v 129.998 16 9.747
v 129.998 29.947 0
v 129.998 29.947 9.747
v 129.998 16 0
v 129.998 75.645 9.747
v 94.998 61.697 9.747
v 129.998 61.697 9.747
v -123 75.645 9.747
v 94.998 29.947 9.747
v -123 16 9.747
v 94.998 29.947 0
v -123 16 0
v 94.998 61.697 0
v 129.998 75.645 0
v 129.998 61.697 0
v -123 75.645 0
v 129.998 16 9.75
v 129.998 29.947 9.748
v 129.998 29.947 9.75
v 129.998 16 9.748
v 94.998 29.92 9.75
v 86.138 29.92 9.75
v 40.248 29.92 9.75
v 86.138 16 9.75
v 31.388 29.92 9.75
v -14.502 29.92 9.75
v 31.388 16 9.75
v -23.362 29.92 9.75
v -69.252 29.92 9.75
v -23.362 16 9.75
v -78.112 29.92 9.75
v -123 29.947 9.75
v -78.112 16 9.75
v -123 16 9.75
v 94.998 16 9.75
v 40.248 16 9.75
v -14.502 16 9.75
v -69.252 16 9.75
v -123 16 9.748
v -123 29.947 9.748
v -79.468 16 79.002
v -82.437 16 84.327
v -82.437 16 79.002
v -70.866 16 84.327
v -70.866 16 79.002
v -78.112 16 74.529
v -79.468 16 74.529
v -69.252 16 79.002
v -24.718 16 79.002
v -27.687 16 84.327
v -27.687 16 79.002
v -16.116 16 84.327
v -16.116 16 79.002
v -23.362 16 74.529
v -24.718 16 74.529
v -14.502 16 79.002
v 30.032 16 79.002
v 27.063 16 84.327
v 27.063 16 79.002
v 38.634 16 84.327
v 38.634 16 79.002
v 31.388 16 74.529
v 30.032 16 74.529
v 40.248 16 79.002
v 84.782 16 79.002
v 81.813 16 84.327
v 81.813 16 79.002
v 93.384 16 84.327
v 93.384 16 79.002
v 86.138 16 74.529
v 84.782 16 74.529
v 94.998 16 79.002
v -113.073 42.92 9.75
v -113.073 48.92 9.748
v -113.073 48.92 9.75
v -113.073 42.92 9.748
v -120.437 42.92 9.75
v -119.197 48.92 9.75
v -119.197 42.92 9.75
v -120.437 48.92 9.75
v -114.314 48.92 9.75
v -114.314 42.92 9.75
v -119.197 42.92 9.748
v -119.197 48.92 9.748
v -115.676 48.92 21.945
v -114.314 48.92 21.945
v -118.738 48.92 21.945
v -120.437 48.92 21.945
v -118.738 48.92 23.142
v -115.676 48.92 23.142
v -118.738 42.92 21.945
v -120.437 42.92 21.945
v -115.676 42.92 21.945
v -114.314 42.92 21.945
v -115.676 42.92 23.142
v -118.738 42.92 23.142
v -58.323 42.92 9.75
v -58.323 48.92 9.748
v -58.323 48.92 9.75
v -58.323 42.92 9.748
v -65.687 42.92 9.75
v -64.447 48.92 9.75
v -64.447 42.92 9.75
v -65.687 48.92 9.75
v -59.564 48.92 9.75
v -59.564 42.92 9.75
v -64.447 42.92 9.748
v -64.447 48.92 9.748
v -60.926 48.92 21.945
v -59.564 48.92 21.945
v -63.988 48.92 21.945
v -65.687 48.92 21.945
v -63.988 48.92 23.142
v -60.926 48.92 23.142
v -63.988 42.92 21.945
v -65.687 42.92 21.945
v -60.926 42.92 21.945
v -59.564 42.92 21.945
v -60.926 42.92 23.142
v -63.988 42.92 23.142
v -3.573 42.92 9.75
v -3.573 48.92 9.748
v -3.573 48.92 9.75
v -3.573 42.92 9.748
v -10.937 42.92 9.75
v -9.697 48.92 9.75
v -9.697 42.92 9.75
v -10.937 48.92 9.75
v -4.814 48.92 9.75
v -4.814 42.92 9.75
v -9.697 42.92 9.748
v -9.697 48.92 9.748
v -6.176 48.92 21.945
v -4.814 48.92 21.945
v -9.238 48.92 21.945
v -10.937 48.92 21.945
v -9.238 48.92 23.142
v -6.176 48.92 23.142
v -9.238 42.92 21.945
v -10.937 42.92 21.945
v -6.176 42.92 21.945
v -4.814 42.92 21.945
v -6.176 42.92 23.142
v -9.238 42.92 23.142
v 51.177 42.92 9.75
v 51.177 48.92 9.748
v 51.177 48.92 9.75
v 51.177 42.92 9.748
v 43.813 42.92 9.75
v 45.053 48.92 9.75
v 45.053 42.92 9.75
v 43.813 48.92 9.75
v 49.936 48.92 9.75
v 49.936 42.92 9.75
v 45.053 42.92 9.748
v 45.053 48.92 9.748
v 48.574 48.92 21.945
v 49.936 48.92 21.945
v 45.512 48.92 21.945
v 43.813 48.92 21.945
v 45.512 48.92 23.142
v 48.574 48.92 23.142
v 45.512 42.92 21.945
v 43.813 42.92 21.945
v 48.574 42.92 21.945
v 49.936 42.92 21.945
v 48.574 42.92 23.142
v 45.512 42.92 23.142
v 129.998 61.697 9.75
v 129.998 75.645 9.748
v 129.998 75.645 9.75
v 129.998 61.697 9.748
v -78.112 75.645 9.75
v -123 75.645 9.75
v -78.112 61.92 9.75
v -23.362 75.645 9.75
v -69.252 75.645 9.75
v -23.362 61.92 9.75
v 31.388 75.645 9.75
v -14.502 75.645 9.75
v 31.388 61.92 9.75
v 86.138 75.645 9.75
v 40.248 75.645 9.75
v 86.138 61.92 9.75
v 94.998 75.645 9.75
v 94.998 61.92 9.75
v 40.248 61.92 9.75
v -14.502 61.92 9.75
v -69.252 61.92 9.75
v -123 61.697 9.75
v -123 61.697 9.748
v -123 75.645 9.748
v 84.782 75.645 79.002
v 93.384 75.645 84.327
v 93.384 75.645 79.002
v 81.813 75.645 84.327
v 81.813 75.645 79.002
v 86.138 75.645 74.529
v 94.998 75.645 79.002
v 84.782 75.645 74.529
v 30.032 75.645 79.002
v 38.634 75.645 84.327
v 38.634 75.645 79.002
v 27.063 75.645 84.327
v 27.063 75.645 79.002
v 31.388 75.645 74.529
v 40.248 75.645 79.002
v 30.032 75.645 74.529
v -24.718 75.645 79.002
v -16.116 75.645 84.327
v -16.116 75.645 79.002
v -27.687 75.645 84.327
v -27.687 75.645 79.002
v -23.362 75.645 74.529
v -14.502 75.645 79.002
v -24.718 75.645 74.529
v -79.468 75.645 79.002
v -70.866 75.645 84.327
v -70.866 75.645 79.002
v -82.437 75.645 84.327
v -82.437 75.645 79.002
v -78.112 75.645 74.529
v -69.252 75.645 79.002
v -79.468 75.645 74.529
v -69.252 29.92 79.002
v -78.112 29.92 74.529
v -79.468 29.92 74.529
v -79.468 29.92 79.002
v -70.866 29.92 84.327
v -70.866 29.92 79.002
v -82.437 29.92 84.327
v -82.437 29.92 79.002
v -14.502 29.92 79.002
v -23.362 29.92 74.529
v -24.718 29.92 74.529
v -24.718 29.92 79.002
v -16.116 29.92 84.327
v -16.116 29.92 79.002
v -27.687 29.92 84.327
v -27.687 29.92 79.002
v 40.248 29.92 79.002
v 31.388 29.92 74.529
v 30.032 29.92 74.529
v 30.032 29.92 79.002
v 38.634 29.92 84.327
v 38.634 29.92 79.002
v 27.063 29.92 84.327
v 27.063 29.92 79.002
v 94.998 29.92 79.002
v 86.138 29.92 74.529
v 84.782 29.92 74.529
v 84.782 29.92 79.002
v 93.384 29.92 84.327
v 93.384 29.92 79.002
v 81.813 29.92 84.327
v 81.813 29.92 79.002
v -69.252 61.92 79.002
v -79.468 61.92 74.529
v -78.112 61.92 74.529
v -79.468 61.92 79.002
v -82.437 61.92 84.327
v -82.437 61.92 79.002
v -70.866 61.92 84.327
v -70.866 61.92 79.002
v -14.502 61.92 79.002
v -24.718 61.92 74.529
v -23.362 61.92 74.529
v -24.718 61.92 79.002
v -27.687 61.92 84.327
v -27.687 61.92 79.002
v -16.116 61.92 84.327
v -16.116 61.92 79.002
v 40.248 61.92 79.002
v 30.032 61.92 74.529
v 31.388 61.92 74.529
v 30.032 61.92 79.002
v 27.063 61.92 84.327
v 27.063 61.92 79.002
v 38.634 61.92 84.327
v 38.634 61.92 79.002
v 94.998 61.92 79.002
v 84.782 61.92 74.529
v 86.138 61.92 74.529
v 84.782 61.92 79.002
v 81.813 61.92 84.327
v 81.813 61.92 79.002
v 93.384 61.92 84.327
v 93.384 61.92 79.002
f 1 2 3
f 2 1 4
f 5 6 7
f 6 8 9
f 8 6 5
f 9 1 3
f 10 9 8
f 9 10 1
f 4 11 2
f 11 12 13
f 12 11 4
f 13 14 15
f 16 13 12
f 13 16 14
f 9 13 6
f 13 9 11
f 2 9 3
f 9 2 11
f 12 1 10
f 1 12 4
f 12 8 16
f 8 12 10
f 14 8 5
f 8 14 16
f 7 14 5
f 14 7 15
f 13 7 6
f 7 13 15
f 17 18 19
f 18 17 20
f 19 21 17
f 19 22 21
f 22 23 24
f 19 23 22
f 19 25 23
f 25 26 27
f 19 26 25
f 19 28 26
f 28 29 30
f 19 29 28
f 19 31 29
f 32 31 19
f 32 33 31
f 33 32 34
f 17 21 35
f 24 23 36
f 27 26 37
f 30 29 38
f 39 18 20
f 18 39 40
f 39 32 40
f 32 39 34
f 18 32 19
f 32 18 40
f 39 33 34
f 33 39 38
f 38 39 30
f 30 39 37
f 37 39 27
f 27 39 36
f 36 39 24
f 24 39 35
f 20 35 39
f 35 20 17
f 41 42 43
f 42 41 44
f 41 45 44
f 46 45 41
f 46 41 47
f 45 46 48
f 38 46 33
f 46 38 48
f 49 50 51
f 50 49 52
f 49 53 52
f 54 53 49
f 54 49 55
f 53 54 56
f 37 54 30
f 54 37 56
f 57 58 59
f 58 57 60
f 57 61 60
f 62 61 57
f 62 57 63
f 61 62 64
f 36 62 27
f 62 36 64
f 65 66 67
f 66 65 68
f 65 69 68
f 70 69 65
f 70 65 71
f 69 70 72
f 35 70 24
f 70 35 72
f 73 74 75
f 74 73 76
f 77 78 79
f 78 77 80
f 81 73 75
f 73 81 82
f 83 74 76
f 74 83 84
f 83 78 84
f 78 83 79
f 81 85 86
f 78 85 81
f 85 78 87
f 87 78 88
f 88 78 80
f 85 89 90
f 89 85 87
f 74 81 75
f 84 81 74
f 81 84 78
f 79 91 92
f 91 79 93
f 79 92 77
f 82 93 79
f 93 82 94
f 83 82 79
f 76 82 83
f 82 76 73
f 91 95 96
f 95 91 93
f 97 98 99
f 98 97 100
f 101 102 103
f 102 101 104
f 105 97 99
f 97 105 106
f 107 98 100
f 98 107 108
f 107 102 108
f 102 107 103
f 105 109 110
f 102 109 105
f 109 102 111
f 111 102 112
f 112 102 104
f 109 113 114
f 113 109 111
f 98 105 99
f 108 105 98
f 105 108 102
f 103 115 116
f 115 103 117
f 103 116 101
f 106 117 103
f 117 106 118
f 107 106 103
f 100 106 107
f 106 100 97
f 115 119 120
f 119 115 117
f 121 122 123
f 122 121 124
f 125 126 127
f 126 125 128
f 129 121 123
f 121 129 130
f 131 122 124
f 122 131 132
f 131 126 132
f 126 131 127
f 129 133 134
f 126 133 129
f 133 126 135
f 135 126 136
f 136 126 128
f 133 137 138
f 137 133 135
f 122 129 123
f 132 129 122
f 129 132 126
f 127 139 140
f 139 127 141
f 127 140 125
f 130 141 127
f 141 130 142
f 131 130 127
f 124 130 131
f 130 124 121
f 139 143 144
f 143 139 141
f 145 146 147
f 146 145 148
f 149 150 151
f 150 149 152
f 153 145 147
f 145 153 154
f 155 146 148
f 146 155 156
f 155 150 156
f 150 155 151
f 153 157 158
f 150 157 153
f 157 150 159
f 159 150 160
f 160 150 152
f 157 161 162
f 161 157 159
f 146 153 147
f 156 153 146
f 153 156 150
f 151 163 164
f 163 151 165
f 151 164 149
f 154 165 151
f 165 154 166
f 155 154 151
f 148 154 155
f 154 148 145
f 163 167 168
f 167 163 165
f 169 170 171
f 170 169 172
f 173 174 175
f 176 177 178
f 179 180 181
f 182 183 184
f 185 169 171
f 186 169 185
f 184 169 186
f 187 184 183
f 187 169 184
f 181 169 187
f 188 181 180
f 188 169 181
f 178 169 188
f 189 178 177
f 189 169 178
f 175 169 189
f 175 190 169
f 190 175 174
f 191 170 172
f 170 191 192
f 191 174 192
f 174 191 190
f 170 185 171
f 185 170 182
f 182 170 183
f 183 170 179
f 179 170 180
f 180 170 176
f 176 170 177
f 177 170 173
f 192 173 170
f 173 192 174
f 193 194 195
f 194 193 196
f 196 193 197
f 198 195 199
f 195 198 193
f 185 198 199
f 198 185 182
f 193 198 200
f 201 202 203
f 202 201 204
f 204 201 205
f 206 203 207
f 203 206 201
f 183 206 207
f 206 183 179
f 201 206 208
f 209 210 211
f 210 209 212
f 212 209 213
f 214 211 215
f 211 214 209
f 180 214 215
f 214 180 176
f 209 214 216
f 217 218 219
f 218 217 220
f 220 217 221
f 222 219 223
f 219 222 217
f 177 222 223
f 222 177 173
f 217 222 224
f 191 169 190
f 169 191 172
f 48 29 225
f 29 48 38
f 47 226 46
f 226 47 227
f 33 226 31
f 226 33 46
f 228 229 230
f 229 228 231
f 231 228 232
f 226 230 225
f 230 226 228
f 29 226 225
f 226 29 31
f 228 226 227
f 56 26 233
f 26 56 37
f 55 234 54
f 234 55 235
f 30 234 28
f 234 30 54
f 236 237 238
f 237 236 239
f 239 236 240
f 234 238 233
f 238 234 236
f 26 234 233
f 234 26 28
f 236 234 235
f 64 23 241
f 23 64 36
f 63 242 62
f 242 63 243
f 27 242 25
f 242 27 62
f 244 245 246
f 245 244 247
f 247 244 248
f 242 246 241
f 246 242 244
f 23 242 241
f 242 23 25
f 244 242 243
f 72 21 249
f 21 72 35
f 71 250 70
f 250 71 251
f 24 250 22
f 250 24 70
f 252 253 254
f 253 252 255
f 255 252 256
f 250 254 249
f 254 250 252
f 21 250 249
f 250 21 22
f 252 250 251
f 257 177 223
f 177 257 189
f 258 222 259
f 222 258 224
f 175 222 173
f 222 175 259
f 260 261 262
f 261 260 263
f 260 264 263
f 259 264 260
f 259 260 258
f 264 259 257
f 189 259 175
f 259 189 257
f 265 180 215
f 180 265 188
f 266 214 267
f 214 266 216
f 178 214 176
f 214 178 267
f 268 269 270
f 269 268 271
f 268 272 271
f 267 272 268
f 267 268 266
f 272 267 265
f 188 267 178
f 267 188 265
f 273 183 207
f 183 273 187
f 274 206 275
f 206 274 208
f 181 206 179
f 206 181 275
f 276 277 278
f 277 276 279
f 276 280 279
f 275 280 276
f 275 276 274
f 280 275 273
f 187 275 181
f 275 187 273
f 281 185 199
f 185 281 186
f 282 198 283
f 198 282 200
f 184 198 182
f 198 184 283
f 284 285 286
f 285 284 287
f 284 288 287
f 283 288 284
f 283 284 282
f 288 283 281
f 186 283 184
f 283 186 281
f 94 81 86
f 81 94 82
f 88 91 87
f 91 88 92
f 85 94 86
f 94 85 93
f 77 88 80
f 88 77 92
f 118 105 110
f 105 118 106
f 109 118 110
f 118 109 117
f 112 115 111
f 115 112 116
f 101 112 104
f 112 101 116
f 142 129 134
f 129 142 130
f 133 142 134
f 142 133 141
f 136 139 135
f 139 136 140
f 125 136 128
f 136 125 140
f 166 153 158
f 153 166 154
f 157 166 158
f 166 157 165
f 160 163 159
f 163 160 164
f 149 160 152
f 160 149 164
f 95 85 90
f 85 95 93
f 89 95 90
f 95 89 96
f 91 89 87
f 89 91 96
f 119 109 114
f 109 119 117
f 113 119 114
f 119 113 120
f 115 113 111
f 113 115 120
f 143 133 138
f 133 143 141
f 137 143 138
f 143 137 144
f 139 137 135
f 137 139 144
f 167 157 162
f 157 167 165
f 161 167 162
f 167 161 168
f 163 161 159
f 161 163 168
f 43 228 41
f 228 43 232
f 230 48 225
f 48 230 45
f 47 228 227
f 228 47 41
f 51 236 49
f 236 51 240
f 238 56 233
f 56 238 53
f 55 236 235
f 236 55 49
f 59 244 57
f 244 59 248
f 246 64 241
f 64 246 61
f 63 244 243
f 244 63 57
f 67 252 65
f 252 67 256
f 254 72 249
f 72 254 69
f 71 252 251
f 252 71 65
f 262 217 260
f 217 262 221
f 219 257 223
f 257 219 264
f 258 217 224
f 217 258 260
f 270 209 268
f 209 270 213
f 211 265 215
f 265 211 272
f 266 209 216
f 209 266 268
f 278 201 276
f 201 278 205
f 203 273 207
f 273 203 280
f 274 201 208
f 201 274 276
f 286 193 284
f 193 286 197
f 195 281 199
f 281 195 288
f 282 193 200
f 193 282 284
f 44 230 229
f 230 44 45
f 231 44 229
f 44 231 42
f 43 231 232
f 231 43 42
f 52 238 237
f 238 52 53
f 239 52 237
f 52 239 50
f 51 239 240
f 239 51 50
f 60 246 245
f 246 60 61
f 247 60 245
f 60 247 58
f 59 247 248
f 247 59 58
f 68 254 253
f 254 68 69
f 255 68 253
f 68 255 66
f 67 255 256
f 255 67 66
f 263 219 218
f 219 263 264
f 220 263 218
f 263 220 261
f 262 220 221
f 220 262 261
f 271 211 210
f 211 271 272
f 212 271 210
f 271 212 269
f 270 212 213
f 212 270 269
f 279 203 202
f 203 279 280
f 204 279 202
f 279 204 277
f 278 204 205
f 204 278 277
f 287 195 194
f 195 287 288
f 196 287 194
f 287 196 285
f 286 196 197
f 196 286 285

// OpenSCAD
// Rewritten from layered polygon rebuild into rectilinear cubes
// Each slab is decomposed into axis-aligned rectangles and emitted as cubes.
// Note: This preserves orthogonal geometry; curved/diagonal features (if any) are approximated.

module rect_prism(x1,y1,x2,y2,z0,h){
  translate([x1,y1,z0]) cube([x2-x1, y2-y1, h], center=false);
}

module slab_1() {
  union() {
    rect_prism(94.997986,15.999999,129.997986,29.946999,0,9.747);
    rect_prism(-123.000008,15.999999,94.997986,75.644997,0,9.747);
    rect_prism(94.997986,61.696999,129.997986,75.644997,0,9.747);
  }
}

module slab_2() {
  union() {
    rect_prism(-123.000008,15.999999,129.997986,29.946999,9.748,0.002);
    rect_prism(-119.196615,42.919998,-113.073431,48.919998,9.748,0.002);
    rect_prism(-64.44663,42.919998,-58.323427,48.919998,9.748,0.002);
    rect_prism(-9.696628,42.919998,-3.573428,48.919998,9.748,0.002);
    rect_prism(45.053381,42.919998,51.176573,48.919998,9.748,0.002);
    rect_prism(-123.000008,61.696999,129.997986,75.644997,9.748,0.002);
  }
}

module slab_3_4_5() {
  // Consolidated: slabs 3, 4, and 5 were contiguous in Z and largely repeated.
  // This version merges the eight vertical posts into single prisms and keeps the two brace bands.
  union() {
    // Vertical posts (merged height: 64.779)
    rect_prism(-78.112015,15.999999,-69.252014,29.919998,9.750000,64.779000);
    rect_prism(-23.362015,15.999999,-14.502014,29.919998,9.750000,64.779000);
    rect_prism(31.387985,15.999999,40.247986,29.919998,9.750000,64.779000);
    rect_prism(86.137985,15.999999,94.997986,29.919998,9.750000,64.779000);
    rect_prism(-78.112015,61.919998,-69.252014,75.644997,9.750000,64.779000);
    rect_prism(-23.362015,61.919998,-14.502014,75.644997,9.750000,64.779000);
    rect_prism(31.387985,61.919998,40.247986,75.644997,9.750000,64.779000);
    rect_prism(86.137985,61.919998,94.997986,75.644997,9.750000,64.779000);

    // Lower brace band (wider)
    rect_prism(-120.437410,42.919998,-114.314075,48.919998,9.750000,12.195000);
    rect_prism(-65.687418,42.919998,-59.564071,48.919998,9.750000,12.195000);
    rect_prism(-10.937418,42.919998,-4.814072,48.919998,9.750000,12.195000);
    rect_prism(43.812582,42.919998,49.935932,48.919998,9.750000,12.195000);

    // Upper thin brace band (narrower)
    rect_prism(-118.738005,42.919998,-115.676272,48.919998,21.945000,1.197000);
    rect_prism(-63.988003,42.919998,-60.926268,48.919998,21.945000,1.197000);
    rect_prism(-9.238005,42.919998,-6.176269,48.919998,21.945000,1.197000);
    rect_prism(45.511995,42.919998,48.573739,48.919998,21.945000,1.197000);
  }
}




module slab_6() {
  union() {
    rect_prism(-79.467536,15.999999,-69.252014,29.919998,74.529,4.4726);
    rect_prism(-24.717536,15.999999,-14.502014,29.919998,74.529,4.4726);
    rect_prism(30.032464,15.999999,40.247986,29.919998,74.529,4.4726);
    rect_prism(84.782464,15.999999,94.997986,29.919998,74.529,4.4726);
    rect_prism(-79.467536,61.919998,-69.252014,75.644997,74.529,4.4726);
    rect_prism(-24.717536,61.919998,-14.502014,75.644997,74.529,4.4726);
    rect_prism(30.032464,61.919998,40.247986,75.644997,74.529,4.4726);
    rect_prism(84.782464,61.919998,94.997986,75.644997,74.529,4.4726);
  }
}

module slab_7() {
  union() {
    rect_prism(-82.437039,15.999999,-70.865755,29.919998,79.0016,5.3254);
    rect_prism(-27.687036,15.999999,-16.115755,29.919998,79.0016,5.3254);
    rect_prism(27.062964,15.999999,38.634246,29.919998,79.0016,5.3254);
    rect_prism(81.812961,15.999999,93.384242,29.919998,79.0016,5.3254);
    rect_prism(-82.437039,61.919998,-70.865755,75.644997,79.0016,5.3254);
    rect_prism(-27.687036,61.919998,-16.115755,75.644997,79.0016,5.3254);
    rect_prism(27.062964,61.919998,38.634246,75.644997,79.0016,5.3254);
    rect_prism(81.812961,61.919998,93.384242,75.644997,79.0016,5.3254);
  }
}

module top() {
  union() {
    slab_1();
    slab_2();  
    slab_3_4_5();
    slab_6();
    slab_7();
  }
}

top();
